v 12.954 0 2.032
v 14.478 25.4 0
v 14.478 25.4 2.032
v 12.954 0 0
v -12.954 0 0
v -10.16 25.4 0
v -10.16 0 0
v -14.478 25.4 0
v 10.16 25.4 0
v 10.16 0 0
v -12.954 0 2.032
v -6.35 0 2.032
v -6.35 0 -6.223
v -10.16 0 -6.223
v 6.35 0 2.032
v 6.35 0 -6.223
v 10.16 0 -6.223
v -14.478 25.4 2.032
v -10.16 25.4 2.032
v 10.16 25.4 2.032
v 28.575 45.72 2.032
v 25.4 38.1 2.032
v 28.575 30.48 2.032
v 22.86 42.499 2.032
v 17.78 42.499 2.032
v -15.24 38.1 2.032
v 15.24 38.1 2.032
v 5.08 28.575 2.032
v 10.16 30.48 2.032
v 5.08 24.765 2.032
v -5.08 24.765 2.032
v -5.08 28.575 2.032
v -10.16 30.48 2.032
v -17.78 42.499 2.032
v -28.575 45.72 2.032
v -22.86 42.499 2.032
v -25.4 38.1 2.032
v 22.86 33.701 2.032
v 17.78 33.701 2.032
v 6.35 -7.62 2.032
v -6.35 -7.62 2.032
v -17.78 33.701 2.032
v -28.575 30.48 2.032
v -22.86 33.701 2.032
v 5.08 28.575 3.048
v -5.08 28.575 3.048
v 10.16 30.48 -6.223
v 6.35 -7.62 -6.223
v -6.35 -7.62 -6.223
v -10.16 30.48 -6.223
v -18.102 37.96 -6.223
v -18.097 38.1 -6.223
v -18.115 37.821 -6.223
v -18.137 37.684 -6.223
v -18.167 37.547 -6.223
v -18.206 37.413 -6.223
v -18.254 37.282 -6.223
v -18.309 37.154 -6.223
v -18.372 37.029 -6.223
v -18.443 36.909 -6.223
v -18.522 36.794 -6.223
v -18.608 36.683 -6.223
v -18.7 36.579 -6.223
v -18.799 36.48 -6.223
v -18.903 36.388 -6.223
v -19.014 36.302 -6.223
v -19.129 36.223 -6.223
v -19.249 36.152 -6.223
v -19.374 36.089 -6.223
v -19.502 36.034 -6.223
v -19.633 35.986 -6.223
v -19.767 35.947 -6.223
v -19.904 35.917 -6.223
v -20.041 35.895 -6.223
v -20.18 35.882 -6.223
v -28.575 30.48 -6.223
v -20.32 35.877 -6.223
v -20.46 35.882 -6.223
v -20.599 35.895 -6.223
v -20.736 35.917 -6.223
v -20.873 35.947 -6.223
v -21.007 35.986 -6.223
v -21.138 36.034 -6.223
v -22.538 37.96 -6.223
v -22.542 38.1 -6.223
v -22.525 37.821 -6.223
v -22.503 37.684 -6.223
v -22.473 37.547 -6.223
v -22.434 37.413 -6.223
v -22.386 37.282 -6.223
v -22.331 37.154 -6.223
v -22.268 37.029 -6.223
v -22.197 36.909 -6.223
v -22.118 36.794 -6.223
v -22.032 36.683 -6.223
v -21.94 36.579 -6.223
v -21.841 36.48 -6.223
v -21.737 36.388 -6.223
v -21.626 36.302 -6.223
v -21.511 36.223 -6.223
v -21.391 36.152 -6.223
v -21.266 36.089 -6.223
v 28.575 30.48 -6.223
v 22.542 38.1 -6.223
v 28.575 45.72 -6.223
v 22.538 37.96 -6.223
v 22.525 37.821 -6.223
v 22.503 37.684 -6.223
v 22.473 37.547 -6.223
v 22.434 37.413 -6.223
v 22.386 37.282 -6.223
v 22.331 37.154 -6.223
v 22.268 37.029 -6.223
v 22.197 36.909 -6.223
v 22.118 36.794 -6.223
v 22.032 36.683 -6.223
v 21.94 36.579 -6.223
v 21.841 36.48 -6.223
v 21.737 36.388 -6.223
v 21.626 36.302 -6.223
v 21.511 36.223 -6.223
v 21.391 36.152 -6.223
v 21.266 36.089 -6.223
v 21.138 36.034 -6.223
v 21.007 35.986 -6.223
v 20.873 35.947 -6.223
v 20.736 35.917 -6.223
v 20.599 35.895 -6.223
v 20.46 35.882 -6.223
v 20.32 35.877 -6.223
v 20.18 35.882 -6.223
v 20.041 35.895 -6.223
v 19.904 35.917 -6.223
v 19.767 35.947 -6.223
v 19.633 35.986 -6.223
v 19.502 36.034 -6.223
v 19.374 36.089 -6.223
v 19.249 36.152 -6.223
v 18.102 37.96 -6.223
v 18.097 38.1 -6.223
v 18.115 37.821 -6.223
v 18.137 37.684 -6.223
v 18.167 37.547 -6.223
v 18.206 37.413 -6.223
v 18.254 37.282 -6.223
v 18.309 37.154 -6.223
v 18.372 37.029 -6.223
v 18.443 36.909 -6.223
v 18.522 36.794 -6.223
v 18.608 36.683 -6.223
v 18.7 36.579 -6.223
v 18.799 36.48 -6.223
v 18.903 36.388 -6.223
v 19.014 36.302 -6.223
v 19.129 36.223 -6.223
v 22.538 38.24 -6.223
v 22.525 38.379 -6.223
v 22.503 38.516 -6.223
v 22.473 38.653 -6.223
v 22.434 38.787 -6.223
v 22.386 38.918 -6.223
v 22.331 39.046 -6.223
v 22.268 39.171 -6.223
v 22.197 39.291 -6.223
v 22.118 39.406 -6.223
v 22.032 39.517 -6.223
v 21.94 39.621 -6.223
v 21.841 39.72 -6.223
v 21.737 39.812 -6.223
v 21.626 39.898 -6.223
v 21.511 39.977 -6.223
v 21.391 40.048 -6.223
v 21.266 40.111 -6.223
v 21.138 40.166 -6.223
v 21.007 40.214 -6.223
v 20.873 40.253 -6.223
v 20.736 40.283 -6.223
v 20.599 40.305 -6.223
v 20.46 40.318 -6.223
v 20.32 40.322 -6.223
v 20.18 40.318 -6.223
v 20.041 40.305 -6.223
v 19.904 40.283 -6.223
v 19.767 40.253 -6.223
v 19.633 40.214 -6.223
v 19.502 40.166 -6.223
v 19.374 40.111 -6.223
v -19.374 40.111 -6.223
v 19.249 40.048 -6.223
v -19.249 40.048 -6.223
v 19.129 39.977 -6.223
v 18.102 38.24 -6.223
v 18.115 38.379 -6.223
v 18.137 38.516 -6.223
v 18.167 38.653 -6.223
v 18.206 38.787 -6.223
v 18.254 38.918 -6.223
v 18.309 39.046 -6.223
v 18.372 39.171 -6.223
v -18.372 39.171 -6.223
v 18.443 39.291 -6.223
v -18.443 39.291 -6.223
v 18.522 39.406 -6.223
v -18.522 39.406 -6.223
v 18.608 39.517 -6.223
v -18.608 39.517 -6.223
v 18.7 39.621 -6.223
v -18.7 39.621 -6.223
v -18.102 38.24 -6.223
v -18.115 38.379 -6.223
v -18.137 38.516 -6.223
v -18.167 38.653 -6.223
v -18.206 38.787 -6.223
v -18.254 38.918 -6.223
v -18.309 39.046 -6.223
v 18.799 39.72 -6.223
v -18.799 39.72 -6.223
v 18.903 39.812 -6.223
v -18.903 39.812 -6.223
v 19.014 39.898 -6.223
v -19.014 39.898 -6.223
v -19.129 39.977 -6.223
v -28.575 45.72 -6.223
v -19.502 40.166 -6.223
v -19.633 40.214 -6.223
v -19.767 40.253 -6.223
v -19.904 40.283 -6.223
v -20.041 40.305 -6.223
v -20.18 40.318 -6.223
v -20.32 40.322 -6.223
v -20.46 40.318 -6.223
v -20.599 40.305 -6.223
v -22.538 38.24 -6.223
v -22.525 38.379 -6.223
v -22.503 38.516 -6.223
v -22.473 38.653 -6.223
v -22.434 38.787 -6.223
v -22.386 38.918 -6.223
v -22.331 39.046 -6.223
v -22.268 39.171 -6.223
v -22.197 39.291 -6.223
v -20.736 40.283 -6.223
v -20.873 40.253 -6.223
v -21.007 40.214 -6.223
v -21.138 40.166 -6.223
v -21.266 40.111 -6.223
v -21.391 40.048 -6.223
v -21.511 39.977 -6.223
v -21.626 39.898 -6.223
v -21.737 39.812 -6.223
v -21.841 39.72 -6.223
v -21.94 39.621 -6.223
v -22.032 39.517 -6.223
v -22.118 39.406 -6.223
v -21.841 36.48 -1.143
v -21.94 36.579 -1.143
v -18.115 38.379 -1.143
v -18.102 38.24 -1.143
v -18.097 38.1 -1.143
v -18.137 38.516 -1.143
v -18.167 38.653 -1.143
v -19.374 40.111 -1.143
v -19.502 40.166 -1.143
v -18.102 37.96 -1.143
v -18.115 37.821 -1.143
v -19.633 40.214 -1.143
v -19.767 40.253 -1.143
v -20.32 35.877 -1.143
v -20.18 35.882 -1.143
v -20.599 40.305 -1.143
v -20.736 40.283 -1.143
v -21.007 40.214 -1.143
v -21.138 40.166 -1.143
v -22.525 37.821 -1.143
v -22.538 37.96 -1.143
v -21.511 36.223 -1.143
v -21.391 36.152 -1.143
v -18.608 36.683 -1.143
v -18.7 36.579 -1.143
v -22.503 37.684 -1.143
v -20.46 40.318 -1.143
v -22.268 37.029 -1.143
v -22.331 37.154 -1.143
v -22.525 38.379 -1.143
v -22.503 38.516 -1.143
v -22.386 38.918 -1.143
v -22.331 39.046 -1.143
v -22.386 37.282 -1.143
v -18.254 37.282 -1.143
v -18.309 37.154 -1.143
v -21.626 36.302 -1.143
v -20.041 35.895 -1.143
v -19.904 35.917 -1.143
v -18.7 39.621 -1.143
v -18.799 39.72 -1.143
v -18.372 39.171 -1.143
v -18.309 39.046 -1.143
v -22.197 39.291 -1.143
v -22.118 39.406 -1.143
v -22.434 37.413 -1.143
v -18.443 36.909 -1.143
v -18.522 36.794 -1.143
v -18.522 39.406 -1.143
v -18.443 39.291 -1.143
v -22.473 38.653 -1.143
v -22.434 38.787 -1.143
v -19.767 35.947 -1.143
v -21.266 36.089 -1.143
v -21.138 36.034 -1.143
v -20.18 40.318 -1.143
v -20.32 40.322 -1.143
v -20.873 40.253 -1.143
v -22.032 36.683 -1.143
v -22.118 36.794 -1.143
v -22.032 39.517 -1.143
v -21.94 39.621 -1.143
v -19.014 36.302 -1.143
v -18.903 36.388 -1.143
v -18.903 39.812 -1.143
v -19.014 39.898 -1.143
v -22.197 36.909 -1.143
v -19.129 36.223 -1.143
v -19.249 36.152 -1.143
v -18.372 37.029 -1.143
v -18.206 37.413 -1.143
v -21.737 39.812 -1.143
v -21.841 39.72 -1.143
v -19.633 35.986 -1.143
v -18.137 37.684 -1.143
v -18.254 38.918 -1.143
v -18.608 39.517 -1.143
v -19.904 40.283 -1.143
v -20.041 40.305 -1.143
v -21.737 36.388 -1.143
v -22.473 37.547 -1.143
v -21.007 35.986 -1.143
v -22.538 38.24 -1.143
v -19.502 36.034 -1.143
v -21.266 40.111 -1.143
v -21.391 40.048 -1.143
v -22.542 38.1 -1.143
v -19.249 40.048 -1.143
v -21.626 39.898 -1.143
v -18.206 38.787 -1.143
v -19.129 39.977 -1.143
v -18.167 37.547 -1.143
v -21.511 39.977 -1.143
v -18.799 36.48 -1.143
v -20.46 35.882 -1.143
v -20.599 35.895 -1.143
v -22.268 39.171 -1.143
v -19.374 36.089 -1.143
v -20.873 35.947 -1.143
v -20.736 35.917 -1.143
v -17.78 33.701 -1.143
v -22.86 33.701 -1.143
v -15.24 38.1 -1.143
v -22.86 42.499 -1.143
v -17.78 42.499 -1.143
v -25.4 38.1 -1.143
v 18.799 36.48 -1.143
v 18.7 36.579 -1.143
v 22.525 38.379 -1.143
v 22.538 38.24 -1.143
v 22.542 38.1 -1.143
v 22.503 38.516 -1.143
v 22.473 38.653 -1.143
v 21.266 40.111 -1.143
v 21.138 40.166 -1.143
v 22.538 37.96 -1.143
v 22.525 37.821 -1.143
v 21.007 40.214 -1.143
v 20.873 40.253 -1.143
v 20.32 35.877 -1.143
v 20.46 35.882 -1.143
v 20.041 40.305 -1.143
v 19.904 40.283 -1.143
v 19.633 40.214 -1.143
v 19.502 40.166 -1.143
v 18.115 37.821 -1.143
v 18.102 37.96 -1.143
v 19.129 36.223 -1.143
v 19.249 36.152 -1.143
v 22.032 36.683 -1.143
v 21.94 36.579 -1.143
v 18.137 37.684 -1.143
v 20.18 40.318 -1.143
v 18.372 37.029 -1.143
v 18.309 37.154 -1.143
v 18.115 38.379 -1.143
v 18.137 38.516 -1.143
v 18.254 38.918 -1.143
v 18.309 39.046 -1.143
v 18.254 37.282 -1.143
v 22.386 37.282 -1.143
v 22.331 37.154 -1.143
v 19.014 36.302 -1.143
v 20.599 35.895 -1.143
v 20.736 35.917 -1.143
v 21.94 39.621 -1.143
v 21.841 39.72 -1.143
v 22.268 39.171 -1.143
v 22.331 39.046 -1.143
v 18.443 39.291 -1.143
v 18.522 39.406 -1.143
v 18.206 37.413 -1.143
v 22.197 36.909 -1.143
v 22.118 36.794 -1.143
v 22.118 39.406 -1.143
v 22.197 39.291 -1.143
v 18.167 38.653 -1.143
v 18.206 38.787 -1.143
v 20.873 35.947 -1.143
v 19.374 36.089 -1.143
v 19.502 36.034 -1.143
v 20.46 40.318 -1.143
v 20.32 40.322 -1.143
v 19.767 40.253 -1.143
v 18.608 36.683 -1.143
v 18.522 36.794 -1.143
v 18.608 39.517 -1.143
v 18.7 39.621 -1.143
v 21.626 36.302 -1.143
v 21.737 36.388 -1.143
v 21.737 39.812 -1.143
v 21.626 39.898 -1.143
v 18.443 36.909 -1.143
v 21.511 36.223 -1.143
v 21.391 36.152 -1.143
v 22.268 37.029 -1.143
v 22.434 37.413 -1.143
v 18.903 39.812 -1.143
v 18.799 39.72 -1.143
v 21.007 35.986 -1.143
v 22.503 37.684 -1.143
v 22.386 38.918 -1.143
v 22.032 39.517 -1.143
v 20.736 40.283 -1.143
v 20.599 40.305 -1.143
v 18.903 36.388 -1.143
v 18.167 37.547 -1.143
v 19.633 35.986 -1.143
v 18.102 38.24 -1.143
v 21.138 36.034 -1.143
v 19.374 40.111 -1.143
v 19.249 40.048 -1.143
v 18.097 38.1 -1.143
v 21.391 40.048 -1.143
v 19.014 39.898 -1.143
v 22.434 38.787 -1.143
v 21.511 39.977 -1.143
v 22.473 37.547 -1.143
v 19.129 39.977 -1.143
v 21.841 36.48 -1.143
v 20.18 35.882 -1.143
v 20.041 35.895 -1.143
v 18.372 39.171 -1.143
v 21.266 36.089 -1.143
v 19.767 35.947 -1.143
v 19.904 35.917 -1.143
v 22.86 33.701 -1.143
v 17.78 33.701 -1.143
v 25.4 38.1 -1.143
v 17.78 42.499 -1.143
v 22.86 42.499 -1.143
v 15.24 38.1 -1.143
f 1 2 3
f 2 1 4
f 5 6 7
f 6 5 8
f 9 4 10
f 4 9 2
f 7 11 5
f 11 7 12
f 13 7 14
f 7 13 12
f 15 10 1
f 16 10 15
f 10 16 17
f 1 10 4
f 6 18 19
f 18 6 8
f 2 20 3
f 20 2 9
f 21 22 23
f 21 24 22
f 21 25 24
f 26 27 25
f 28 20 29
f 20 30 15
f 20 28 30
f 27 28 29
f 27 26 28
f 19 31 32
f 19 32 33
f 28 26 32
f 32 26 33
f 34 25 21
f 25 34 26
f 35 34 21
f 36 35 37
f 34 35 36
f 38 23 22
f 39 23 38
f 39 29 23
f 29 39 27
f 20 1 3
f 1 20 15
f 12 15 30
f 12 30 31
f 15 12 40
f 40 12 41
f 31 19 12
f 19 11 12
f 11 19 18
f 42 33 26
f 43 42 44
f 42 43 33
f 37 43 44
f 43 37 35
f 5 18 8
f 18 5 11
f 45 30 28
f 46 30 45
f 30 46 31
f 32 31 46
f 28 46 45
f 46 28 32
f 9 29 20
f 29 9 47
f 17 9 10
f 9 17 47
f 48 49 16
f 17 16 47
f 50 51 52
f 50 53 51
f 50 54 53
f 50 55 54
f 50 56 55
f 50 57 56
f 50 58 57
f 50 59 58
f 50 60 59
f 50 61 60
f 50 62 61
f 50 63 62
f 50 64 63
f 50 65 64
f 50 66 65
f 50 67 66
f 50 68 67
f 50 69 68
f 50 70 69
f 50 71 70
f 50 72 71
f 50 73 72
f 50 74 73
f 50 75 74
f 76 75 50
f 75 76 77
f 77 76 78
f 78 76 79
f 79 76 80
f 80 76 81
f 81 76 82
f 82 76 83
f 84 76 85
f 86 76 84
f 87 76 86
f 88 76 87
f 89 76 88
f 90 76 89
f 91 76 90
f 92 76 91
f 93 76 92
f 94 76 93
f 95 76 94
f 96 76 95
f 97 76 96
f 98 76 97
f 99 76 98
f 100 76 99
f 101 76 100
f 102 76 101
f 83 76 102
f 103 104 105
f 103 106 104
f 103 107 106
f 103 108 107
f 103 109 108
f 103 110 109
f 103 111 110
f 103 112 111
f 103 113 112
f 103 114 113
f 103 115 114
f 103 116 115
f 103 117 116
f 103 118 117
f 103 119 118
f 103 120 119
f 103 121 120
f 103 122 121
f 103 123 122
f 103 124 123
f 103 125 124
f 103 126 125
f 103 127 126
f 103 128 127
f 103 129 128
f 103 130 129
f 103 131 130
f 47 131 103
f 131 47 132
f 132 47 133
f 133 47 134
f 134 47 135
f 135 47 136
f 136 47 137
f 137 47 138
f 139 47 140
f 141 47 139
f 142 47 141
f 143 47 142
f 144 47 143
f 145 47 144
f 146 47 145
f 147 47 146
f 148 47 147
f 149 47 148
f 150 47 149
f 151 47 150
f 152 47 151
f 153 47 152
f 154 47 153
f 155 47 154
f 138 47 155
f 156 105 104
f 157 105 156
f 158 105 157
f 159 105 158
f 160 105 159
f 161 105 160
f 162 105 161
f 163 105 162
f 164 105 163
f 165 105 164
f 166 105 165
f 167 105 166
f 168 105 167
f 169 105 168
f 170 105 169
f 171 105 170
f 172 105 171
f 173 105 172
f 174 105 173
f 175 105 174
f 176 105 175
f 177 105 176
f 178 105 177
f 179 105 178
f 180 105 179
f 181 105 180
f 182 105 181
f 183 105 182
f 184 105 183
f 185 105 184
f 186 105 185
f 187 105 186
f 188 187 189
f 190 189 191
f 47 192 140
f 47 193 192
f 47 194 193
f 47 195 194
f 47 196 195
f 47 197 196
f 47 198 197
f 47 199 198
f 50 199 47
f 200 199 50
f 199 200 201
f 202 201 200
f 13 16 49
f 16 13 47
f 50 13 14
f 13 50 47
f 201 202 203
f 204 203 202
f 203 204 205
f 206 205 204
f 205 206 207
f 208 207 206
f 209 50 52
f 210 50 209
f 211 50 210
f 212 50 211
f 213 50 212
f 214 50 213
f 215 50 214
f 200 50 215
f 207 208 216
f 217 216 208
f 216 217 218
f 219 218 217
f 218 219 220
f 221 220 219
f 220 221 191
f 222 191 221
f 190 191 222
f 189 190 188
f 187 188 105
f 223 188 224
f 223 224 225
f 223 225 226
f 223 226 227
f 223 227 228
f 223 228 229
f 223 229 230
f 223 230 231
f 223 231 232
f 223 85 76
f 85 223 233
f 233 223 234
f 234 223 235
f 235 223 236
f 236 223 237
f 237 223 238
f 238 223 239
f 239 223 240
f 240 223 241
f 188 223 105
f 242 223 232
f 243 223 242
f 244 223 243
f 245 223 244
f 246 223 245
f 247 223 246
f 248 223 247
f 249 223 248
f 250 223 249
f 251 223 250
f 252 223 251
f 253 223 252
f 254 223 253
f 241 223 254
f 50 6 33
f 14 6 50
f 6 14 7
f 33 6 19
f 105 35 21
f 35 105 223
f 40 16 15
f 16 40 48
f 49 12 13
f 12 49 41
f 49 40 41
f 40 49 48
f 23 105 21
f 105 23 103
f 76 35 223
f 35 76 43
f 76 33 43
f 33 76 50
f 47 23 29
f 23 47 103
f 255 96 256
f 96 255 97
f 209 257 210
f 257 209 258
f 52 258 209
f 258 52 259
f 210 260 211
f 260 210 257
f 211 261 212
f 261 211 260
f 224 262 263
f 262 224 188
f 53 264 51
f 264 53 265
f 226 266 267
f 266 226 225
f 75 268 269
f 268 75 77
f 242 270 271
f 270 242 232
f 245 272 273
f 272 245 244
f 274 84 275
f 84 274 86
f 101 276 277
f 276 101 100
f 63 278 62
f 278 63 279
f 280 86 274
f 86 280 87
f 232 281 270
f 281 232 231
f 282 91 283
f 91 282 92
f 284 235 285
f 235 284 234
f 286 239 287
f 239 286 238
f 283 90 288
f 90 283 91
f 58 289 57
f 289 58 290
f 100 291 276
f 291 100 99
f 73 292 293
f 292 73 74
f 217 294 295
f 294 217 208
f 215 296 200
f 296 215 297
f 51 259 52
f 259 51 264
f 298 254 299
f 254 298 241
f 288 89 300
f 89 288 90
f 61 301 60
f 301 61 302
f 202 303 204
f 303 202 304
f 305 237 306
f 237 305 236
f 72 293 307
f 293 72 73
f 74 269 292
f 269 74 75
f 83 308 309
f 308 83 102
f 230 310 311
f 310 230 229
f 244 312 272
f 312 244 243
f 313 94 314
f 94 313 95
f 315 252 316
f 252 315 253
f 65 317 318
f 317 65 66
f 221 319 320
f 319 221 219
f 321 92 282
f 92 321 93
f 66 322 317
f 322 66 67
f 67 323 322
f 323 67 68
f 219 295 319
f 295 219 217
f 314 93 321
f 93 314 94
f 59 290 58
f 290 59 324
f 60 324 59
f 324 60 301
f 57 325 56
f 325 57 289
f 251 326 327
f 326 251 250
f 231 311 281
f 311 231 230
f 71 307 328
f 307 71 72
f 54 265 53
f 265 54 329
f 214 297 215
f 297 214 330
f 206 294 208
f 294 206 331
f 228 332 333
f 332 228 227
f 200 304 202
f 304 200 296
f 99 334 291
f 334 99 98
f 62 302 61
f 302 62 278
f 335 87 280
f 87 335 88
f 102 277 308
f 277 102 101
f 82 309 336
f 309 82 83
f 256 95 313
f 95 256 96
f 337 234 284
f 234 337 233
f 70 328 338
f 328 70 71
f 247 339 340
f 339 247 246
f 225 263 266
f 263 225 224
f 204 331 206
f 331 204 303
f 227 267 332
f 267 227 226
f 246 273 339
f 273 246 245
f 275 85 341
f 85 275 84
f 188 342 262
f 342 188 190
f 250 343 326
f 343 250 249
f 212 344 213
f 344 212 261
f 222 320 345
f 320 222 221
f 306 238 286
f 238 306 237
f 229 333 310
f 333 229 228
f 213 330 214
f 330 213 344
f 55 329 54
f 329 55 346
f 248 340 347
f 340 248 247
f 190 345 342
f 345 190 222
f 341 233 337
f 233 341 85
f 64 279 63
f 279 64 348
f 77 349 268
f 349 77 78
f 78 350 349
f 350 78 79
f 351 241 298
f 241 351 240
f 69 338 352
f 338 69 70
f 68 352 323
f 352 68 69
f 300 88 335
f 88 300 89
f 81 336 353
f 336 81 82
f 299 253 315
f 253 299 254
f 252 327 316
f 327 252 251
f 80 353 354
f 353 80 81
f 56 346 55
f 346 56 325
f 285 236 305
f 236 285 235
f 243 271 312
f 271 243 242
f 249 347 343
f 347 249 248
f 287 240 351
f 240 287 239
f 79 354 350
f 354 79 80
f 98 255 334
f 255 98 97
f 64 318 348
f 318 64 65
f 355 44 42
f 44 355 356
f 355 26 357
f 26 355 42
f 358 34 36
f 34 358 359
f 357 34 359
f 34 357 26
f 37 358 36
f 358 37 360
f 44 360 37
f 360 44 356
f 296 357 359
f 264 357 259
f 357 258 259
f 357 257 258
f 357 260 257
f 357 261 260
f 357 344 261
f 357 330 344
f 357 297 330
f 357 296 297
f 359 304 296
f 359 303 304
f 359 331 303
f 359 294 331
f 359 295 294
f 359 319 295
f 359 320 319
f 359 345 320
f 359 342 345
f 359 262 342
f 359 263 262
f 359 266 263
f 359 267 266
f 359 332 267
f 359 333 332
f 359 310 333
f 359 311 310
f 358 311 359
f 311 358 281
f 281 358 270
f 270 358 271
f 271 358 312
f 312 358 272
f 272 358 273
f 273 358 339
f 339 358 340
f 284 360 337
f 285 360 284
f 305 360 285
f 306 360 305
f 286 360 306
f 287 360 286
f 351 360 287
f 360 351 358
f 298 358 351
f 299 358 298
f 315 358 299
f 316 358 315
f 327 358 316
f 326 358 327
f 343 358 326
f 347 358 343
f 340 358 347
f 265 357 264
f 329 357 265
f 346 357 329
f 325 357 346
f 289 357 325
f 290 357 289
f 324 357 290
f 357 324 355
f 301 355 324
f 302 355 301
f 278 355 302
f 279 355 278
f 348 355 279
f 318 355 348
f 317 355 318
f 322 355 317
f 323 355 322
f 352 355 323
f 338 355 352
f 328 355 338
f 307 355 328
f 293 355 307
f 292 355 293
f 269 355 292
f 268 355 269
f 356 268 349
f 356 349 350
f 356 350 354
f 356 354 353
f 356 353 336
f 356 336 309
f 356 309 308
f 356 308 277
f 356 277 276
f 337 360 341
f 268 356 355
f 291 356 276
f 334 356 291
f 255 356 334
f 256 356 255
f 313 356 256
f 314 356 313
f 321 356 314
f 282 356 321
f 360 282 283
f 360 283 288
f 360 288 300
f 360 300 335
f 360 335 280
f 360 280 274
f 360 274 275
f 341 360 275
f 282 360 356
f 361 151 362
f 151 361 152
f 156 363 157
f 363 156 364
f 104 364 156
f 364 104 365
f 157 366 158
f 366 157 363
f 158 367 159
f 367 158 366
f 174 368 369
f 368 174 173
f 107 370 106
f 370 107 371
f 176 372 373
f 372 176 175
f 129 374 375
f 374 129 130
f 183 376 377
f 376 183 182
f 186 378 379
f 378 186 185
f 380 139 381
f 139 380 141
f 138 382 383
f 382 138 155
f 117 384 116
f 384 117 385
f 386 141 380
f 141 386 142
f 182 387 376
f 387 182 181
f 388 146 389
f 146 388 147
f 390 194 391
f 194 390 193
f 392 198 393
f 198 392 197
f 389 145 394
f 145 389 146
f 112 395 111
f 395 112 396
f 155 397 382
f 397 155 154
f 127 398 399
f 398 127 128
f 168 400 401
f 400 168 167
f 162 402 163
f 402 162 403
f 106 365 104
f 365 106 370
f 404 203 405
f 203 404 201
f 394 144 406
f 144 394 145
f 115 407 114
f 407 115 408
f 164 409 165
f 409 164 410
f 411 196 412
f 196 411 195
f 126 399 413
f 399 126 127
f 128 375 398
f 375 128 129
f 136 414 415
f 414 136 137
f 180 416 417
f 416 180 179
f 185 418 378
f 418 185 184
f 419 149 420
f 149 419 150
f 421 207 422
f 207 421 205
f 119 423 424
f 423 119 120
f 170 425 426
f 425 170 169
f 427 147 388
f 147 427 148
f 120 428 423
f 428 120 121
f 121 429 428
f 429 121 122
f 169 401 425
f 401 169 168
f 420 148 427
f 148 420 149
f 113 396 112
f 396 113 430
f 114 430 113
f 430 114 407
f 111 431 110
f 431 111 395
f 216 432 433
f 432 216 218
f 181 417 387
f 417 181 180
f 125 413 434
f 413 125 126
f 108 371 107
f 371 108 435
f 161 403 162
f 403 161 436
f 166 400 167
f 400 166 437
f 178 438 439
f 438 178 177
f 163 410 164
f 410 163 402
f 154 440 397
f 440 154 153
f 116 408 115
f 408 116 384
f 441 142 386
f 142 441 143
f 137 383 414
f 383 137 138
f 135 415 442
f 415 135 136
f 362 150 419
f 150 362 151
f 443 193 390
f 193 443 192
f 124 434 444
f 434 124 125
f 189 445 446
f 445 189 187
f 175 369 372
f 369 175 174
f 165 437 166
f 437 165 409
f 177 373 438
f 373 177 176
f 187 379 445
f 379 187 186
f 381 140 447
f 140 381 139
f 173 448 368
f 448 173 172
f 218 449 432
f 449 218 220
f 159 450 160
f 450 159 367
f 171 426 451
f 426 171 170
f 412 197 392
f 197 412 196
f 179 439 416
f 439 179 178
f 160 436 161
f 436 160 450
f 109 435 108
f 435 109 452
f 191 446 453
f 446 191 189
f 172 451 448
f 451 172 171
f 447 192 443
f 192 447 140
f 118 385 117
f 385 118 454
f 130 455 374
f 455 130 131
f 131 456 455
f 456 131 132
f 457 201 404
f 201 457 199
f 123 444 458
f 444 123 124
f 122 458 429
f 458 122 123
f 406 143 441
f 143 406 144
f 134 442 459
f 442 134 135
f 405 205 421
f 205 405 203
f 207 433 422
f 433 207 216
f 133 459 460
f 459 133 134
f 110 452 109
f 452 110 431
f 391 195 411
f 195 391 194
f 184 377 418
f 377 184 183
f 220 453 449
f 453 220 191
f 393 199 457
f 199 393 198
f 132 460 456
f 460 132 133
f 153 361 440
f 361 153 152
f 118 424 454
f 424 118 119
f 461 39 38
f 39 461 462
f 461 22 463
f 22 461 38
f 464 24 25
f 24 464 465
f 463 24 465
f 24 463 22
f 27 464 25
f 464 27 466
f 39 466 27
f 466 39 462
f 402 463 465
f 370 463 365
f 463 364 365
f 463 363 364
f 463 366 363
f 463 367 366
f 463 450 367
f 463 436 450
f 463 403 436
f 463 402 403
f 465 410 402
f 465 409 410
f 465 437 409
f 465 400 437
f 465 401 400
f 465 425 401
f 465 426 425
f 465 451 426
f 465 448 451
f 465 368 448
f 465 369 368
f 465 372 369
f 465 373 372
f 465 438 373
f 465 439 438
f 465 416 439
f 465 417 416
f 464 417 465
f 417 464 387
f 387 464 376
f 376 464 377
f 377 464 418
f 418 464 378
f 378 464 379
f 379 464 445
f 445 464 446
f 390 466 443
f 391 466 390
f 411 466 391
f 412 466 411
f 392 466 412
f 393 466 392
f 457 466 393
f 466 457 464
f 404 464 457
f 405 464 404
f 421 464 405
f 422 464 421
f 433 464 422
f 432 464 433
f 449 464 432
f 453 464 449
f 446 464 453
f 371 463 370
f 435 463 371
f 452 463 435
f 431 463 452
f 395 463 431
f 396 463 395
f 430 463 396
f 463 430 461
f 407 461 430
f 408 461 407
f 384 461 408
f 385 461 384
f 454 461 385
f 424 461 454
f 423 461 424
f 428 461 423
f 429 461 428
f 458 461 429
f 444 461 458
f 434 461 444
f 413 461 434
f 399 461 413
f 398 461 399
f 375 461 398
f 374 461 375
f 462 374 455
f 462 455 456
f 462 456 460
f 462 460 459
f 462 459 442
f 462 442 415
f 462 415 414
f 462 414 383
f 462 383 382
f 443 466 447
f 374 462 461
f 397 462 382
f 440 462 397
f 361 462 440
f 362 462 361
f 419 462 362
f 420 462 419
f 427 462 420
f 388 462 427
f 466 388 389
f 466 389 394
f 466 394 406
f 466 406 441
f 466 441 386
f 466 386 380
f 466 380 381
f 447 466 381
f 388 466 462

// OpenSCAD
/* OpenSCAD file for my helmet lamp bracket
 * Tom Trebisky  10-12-2022
 */

// We broke the original front bracket
//  (as well as the piece it bolts to)
//  so we need to print a modified version.
new_front = true;

// Front and Back are different
front = true;
// front = false;

/* I make all my measurements in inches.
 * We need to convert to mm so the STL file will be in mm.
 */
mmpi = 25.4;
function mm(x) = x * mmpi;

/* I printed one at 0.085 and it came out .085, but it binds in the slots.
 * So 0.080 is better.
 */
pth = mm ( 0.080 );	// plate thickness

/* The "plate" is the trapezoid piece that fits into the helmet "dovetail"
 */

/* I made my test print and got:
 * height = 1.015
 * base = 1.075
 * top = 1.18
 * So - it is printing oversize by .01 to .025
 */

// base = 1.04;
// top = 1.16;

h = mm ( 1.0 );		// plate height
b = mm ( 1.02 );	// plate base
t = mm ( 1.14 );	// plate top

// Now the latch
ll = mm ( 1.125 );	// latch location
lw = mm ( 0.40 );	// latch width
lh = mm ( 0.04 );	// latch height
lb = mm ( 0.150 );	// latch base

// box1 - main body, sticks out top
bw = mm ( 0.80 );	// box width
bt = mm ( 0.325 );	// box thickness
bl = mm ( front ? 1.8 : 1.7 );	// box length

// box2 - sticks out bottom
b2_extra = mm ( 0.3 );
bw2 = mm ( 0.50 );	// box width
bt2 = mm ( 0.325 );	// box thickness
bl2 = bl + b2_extra;	// box length
by2 = -b2_extra;	// box length

// box3 - front only, bar on top
bw3 = mm ( 1.50 );	// box width
bt3 = mm ( 0.325 );	// box thickness
bl3 = mm ( 0.60 );	// box length
by3 = bl - bl3;

// new_box3 - new front only, bar on top
nbw3 = mm ( 2.25 );	// box width

// front hole spacing
fhs = mm ( 0.86 );

// new front hole spacing
nfhs = mm ( 1.60 );

// Hole dimensions
// hole at .166 was to small.
// hex at 0.39 fit some nuts, but tight
hole_diam = mm ( 0.175 );
hex_diam = mm ( 0.40 );
hex_thick = mm ( 0.125 );

// define the shape of the plate
trap = [
	[-b/2, 0 ],
	[-t/2, h ],
	[t/2, h ],
	[b/2, 0 ]
    ];

module plate () {
    linear_extrude ( pth )
	polygon ( trap );
}

module latch () {

    tri = [
	[0, 0 ],
	[0, lb ],
	[lh, lb ]
    ];

    color ( "red" );
    translate ( [ lw/2, ll-lb, pth ] )
	rotate ( [0, -90, 0 ] )
	    linear_extrude ( lw )
		polygon ( tri );
}

module box1 () {
    translate ( [ -bw/2, 0, pth-bt] )
	cube ( [ bw, bl, bt ] );
}

module box2 () {
    translate ( [ -bw2/2, by2, pth-bt] )
	cube ( [ bw2, bl2, bt2 ] );
}

module box3 () {
    translate ( [ -bw3/2, by3, pth-bt] )
	cube ( [ bw3, bl3, bt3 ] );
}

module nbox3 () {
    translate ( [ -nbw3/2, by3, pth-bt] )
	cube ( [ nbw3, bl3, bt3 ] );
}


module hex () {
    del = 1;
    ht = hex_thick + del;
    cylinder ( d=hex_diam, h=ht, $fn=6 );
}

module hole ( xloc, yloc ) {
    del = 1;
    ht = bt + 2*del;
    translate ( [ xloc, yloc, pth-bt-del ] )
	union () {
	    cylinder ( d=hole_diam, h=ht, $fn=100 );
	    translate ( [ 0, 0, bt-hex_thick+del] )
		hex ();
	}
}

module back_bracket () {
    difference () {

	union () {
	    plate ();
	    latch ();
	    box1 ();
	    box2 ();
	}

	hole ( 0, mm(-0.05) );
	hole ( 0, mm(1.35) );
    }
}

module front_bracket () {
    difference () {

	union () {
	    plate ();
	    latch ();
	    box1 ();
	    box2 ();
	    box3 ();
	}

	hole ( -fhs/2, mm(1.5) );
	hole ( fhs/2, mm(1.5) );
    }
}

module new_front_bracket () {
    difference () {

	union () {
	    plate ();
	    latch ();
	    box1 ();
	    box2 ();
	    nbox3 ();
	}

	hole ( -nfhs/2, mm(1.5) );
	hole ( nfhs/2, mm(1.5) );
    }
}

	if ( new_front )
	    new_front_bracket ();
	else if ( front )
	    front_bracket ();
	else
	    back_bracket ();

// THE END
